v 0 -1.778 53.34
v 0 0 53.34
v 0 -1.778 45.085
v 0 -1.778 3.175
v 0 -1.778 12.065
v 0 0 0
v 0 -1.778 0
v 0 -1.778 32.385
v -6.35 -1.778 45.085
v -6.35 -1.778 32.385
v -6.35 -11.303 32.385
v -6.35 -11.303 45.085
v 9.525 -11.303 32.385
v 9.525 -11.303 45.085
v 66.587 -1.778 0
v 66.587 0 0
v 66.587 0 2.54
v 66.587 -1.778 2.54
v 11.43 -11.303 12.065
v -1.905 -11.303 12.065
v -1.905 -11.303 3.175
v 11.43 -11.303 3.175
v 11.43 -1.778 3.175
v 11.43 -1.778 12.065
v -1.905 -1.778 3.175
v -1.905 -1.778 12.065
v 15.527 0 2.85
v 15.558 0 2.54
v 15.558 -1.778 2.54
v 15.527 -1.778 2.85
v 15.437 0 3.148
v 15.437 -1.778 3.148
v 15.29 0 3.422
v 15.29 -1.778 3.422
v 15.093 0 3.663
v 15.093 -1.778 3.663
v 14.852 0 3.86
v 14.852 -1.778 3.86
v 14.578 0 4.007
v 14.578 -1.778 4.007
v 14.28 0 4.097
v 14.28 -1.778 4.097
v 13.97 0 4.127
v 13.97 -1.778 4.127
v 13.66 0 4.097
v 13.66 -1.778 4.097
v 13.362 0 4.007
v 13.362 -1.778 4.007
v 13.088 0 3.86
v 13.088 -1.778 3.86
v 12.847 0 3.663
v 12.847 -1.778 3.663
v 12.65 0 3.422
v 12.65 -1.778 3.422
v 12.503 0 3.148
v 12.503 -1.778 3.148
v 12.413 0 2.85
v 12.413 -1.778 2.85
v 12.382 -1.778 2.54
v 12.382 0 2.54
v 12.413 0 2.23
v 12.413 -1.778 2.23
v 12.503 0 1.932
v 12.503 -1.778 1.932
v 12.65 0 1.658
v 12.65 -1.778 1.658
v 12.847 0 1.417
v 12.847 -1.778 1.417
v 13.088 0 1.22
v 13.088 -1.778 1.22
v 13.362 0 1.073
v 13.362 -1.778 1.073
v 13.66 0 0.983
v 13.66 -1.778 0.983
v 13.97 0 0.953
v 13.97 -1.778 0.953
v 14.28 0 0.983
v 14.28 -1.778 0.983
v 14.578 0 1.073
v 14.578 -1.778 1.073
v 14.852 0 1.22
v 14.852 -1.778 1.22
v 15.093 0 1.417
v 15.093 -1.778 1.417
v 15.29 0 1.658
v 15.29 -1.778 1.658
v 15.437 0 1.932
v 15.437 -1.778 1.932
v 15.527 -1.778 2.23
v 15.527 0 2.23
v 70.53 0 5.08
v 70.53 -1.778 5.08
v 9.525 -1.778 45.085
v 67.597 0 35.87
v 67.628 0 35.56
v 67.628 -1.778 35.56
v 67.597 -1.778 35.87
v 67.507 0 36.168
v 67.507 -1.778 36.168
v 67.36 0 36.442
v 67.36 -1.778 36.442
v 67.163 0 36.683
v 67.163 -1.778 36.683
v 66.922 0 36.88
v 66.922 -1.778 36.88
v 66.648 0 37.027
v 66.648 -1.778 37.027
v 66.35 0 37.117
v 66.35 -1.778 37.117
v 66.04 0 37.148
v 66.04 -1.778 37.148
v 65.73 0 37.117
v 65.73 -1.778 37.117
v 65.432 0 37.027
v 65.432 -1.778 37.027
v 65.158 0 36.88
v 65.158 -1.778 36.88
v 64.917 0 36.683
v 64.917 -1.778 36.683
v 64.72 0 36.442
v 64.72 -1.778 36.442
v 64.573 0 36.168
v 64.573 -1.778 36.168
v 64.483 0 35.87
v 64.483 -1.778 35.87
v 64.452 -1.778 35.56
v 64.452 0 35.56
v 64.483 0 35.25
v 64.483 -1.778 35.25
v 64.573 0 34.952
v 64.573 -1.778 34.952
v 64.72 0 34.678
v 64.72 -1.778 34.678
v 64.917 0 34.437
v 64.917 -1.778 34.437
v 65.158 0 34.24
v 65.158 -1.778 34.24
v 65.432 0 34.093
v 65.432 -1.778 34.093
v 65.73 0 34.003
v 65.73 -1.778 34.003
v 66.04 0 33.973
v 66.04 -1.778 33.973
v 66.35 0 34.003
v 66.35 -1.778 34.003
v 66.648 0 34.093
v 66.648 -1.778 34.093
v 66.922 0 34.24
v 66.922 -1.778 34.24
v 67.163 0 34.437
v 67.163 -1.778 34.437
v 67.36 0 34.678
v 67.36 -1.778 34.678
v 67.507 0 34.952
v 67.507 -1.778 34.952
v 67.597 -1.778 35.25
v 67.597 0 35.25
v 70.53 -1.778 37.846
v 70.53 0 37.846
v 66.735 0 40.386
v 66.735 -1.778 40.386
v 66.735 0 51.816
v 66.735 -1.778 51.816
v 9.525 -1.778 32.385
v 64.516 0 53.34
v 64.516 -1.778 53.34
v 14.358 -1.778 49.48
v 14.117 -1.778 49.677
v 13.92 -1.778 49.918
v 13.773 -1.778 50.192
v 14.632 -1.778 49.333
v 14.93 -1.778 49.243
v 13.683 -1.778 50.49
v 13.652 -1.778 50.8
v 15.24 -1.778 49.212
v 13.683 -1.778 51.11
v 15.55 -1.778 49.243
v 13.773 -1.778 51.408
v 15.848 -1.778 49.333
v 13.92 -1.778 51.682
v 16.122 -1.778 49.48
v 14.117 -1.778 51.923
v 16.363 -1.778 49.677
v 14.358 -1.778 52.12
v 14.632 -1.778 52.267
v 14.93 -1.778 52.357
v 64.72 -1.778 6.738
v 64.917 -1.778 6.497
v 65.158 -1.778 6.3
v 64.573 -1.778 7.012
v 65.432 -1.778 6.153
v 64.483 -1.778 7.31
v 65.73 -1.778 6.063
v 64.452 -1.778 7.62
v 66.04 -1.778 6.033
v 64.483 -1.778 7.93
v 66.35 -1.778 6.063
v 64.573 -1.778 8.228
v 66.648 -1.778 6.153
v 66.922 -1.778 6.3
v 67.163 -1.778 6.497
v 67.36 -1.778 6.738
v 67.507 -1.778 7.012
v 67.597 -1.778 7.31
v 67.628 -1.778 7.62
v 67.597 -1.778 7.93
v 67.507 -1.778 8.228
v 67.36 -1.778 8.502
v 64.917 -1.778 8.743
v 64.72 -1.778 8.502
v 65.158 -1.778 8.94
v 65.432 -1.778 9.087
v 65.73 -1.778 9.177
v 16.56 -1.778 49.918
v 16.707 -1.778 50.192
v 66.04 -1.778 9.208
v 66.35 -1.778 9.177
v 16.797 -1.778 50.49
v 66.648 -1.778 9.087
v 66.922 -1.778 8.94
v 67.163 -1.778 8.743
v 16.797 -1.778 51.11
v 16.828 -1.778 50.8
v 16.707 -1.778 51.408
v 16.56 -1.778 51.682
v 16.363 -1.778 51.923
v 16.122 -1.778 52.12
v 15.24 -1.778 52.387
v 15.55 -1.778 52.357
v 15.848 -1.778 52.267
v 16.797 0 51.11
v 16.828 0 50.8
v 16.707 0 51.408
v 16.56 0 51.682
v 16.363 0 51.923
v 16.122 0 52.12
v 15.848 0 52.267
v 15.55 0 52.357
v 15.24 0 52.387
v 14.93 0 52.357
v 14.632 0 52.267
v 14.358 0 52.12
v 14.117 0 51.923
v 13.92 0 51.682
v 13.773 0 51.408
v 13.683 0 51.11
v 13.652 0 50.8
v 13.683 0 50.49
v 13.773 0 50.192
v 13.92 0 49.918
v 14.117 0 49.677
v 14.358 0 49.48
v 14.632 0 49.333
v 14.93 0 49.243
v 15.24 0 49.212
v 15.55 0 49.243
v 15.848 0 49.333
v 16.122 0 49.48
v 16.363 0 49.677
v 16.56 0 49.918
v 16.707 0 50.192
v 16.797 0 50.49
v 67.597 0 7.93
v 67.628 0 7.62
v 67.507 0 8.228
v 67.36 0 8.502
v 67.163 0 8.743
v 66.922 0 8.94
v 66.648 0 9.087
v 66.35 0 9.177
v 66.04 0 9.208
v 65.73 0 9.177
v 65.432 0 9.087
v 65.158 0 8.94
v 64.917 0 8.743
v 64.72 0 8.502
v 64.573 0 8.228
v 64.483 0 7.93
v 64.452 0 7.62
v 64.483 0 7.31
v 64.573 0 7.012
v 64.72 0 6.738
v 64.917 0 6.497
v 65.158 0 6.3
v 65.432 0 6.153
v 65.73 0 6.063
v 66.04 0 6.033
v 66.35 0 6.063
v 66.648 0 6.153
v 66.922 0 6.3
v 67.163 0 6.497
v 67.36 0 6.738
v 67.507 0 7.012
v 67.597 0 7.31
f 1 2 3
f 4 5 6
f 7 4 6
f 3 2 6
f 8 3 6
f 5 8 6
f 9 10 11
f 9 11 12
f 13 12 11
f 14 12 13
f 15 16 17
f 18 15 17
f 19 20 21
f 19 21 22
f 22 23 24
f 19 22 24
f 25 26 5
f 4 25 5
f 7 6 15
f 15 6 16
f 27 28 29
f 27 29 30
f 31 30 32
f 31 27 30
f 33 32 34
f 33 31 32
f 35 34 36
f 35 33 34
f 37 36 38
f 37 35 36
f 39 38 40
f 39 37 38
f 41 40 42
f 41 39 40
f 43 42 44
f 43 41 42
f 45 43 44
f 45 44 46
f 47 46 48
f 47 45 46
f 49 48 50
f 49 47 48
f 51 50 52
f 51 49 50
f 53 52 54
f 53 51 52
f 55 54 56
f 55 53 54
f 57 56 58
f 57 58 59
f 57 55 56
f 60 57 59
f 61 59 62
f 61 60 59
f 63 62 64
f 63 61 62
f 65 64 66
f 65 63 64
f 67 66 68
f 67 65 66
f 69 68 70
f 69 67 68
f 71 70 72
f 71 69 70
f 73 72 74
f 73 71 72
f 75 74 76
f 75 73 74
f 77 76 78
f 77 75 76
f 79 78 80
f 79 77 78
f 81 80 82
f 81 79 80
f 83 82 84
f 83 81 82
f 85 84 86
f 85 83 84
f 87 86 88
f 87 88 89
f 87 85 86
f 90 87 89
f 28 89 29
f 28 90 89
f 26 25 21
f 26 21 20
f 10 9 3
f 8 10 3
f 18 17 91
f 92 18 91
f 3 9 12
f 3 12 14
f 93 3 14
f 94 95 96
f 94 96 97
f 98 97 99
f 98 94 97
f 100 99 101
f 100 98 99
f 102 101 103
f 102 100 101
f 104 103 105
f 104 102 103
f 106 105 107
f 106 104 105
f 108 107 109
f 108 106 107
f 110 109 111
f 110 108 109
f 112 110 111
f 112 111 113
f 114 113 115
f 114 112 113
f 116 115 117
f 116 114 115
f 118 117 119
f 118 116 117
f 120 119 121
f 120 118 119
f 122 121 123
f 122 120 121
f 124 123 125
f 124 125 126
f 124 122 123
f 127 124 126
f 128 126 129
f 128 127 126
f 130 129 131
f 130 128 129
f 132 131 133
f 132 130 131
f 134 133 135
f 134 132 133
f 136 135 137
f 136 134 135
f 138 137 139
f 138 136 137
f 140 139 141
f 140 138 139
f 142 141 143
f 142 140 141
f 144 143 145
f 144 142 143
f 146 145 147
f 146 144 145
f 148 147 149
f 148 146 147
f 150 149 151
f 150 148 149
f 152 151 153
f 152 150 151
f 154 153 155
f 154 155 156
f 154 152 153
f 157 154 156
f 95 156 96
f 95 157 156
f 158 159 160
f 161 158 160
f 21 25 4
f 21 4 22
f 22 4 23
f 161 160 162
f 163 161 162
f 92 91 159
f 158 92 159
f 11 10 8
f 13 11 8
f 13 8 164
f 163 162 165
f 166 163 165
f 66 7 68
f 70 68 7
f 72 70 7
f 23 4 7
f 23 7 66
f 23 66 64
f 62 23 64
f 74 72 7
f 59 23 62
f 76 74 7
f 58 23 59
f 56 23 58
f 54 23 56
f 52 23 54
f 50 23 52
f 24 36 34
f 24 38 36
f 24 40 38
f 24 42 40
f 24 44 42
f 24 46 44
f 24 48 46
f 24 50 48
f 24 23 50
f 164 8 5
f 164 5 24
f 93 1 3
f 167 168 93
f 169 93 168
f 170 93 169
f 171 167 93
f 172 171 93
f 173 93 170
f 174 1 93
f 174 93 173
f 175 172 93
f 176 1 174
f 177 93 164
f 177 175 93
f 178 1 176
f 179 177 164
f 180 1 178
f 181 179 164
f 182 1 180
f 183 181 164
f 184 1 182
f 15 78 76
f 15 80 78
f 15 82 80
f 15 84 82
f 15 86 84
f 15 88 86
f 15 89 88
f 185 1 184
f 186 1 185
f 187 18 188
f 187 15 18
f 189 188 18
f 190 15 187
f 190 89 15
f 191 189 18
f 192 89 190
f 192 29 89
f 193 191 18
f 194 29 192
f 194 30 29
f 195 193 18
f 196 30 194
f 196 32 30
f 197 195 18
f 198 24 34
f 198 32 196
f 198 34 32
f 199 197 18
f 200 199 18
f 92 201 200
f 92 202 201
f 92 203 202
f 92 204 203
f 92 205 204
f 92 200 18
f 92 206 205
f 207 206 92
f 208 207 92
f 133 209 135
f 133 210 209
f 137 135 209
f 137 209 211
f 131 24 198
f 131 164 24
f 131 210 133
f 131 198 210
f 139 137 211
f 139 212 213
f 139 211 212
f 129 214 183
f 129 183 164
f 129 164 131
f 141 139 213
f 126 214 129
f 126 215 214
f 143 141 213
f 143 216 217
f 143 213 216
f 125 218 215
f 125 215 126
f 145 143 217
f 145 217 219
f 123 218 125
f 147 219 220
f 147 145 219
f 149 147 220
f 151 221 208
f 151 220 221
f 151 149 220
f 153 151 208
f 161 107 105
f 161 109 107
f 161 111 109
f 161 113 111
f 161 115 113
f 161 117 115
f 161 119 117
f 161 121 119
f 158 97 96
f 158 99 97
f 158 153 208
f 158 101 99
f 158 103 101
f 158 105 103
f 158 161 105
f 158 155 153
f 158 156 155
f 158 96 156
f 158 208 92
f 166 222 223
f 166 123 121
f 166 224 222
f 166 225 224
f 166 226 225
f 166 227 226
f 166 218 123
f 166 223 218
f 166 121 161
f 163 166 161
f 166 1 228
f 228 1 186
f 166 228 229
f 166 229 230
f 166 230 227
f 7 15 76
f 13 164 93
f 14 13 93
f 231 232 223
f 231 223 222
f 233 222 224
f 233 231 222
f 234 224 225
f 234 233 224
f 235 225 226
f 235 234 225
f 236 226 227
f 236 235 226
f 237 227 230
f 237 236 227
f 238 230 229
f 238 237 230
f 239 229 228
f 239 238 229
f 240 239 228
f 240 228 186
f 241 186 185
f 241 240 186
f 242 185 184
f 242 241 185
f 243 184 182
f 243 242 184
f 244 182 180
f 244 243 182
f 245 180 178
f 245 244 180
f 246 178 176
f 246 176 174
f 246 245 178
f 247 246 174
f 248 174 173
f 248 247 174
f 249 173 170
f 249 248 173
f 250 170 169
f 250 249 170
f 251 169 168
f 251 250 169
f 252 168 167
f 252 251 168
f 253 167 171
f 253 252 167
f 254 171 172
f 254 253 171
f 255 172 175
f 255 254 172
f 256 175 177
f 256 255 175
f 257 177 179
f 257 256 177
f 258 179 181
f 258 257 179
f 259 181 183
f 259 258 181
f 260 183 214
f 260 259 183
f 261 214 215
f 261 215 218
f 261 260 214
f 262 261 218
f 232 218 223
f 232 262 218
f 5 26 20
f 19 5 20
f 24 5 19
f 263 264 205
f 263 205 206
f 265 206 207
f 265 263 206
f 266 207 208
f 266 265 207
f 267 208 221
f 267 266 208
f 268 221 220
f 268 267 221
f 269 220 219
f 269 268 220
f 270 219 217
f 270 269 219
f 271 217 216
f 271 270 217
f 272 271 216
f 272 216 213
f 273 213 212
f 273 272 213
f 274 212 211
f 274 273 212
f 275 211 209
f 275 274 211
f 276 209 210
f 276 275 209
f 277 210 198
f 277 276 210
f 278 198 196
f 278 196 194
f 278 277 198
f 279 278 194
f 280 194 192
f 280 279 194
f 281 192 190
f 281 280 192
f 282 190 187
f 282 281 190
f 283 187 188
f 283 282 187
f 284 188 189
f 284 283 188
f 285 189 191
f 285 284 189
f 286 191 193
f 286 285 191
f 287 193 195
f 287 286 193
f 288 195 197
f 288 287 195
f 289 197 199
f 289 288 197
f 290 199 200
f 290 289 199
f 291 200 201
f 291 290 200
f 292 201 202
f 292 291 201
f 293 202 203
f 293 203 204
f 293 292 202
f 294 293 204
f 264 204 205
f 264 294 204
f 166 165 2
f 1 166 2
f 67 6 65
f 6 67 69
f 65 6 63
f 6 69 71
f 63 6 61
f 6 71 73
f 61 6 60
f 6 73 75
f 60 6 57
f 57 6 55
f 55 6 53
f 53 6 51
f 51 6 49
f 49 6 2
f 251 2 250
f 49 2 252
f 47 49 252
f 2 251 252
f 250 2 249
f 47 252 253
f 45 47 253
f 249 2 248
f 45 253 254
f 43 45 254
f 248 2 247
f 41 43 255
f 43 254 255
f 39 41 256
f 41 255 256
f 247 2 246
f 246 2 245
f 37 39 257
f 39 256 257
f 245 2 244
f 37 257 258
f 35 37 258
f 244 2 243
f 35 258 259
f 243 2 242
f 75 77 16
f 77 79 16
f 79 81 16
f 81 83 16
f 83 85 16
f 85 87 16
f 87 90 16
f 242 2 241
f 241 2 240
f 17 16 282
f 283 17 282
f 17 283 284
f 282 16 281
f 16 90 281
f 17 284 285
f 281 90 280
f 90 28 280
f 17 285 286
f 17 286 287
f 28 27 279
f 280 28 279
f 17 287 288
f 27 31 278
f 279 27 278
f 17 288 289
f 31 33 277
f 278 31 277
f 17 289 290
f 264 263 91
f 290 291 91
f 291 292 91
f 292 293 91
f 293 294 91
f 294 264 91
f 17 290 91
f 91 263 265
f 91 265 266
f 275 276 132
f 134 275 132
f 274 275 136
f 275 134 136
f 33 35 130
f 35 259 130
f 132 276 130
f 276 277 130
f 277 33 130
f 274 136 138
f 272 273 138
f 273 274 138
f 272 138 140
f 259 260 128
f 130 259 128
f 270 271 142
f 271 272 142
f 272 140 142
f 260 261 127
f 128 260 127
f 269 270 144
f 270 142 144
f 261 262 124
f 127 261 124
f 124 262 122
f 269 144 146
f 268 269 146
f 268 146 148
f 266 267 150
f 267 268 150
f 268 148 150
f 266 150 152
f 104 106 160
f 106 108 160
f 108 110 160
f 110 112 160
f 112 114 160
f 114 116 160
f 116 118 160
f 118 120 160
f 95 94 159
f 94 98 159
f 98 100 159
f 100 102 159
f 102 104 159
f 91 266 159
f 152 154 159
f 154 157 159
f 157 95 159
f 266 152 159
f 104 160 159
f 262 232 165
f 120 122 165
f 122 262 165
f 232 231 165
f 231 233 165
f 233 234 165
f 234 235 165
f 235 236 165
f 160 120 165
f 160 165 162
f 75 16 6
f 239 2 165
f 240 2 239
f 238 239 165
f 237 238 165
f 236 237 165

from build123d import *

# Parameters (mm, degrees)
F0_R     = 1.5875
F1_DEPTH = 1.778
F2_W     = 13.335
F2_H     = 8.89
F3_DEPTH = 9.525
F4_W     = 15.875
F4_H     = 12.7
F5_DEPTH = 9.525


with BuildPart() as f1:
    # F0 (on Front) → F1 (new body)
    with BuildSketch(Plane.XZ):
        Polygon((0, 53.34), (0, 0), (66.58718, 0), (66.58718, 2.54), (70.5304, 5.08), (70.5304, 37.846), (66.735297, 40.386), (66.735297, 51.816), (64.516, 53.34), align=None)
        with Locations((13.97, 2.54)):
            Circle(F0_R, mode=Mode.SUBTRACT)
        with Locations((66.04, 7.62)):
            Circle(F0_R, mode=Mode.SUBTRACT)
        with Locations((15.24, 50.8)):
            Circle(F0_R, mode=Mode.SUBTRACT)
        with Locations((66.04, 35.56)):
            Circle(F0_R, mode=Mode.SUBTRACT)
    extrude(amount=F1_DEPTH)

    # F2 (on face) → F3 (join)
    with BuildSketch(Plane.XZ.offset(1.778)):
        with Locations((4.7625, 7.62)):
            Rectangle(F2_W, F2_H)
    extrude(amount=F3_DEPTH)

    # F4 (on face) → F5 (join)
    with BuildSketch(Plane.XZ.offset(1.778)):
        with Locations((1.5875, 38.735)):
            Rectangle(F4_W, F4_H)
    extrude(amount=F5_DEPTH)


solid = f1.part
